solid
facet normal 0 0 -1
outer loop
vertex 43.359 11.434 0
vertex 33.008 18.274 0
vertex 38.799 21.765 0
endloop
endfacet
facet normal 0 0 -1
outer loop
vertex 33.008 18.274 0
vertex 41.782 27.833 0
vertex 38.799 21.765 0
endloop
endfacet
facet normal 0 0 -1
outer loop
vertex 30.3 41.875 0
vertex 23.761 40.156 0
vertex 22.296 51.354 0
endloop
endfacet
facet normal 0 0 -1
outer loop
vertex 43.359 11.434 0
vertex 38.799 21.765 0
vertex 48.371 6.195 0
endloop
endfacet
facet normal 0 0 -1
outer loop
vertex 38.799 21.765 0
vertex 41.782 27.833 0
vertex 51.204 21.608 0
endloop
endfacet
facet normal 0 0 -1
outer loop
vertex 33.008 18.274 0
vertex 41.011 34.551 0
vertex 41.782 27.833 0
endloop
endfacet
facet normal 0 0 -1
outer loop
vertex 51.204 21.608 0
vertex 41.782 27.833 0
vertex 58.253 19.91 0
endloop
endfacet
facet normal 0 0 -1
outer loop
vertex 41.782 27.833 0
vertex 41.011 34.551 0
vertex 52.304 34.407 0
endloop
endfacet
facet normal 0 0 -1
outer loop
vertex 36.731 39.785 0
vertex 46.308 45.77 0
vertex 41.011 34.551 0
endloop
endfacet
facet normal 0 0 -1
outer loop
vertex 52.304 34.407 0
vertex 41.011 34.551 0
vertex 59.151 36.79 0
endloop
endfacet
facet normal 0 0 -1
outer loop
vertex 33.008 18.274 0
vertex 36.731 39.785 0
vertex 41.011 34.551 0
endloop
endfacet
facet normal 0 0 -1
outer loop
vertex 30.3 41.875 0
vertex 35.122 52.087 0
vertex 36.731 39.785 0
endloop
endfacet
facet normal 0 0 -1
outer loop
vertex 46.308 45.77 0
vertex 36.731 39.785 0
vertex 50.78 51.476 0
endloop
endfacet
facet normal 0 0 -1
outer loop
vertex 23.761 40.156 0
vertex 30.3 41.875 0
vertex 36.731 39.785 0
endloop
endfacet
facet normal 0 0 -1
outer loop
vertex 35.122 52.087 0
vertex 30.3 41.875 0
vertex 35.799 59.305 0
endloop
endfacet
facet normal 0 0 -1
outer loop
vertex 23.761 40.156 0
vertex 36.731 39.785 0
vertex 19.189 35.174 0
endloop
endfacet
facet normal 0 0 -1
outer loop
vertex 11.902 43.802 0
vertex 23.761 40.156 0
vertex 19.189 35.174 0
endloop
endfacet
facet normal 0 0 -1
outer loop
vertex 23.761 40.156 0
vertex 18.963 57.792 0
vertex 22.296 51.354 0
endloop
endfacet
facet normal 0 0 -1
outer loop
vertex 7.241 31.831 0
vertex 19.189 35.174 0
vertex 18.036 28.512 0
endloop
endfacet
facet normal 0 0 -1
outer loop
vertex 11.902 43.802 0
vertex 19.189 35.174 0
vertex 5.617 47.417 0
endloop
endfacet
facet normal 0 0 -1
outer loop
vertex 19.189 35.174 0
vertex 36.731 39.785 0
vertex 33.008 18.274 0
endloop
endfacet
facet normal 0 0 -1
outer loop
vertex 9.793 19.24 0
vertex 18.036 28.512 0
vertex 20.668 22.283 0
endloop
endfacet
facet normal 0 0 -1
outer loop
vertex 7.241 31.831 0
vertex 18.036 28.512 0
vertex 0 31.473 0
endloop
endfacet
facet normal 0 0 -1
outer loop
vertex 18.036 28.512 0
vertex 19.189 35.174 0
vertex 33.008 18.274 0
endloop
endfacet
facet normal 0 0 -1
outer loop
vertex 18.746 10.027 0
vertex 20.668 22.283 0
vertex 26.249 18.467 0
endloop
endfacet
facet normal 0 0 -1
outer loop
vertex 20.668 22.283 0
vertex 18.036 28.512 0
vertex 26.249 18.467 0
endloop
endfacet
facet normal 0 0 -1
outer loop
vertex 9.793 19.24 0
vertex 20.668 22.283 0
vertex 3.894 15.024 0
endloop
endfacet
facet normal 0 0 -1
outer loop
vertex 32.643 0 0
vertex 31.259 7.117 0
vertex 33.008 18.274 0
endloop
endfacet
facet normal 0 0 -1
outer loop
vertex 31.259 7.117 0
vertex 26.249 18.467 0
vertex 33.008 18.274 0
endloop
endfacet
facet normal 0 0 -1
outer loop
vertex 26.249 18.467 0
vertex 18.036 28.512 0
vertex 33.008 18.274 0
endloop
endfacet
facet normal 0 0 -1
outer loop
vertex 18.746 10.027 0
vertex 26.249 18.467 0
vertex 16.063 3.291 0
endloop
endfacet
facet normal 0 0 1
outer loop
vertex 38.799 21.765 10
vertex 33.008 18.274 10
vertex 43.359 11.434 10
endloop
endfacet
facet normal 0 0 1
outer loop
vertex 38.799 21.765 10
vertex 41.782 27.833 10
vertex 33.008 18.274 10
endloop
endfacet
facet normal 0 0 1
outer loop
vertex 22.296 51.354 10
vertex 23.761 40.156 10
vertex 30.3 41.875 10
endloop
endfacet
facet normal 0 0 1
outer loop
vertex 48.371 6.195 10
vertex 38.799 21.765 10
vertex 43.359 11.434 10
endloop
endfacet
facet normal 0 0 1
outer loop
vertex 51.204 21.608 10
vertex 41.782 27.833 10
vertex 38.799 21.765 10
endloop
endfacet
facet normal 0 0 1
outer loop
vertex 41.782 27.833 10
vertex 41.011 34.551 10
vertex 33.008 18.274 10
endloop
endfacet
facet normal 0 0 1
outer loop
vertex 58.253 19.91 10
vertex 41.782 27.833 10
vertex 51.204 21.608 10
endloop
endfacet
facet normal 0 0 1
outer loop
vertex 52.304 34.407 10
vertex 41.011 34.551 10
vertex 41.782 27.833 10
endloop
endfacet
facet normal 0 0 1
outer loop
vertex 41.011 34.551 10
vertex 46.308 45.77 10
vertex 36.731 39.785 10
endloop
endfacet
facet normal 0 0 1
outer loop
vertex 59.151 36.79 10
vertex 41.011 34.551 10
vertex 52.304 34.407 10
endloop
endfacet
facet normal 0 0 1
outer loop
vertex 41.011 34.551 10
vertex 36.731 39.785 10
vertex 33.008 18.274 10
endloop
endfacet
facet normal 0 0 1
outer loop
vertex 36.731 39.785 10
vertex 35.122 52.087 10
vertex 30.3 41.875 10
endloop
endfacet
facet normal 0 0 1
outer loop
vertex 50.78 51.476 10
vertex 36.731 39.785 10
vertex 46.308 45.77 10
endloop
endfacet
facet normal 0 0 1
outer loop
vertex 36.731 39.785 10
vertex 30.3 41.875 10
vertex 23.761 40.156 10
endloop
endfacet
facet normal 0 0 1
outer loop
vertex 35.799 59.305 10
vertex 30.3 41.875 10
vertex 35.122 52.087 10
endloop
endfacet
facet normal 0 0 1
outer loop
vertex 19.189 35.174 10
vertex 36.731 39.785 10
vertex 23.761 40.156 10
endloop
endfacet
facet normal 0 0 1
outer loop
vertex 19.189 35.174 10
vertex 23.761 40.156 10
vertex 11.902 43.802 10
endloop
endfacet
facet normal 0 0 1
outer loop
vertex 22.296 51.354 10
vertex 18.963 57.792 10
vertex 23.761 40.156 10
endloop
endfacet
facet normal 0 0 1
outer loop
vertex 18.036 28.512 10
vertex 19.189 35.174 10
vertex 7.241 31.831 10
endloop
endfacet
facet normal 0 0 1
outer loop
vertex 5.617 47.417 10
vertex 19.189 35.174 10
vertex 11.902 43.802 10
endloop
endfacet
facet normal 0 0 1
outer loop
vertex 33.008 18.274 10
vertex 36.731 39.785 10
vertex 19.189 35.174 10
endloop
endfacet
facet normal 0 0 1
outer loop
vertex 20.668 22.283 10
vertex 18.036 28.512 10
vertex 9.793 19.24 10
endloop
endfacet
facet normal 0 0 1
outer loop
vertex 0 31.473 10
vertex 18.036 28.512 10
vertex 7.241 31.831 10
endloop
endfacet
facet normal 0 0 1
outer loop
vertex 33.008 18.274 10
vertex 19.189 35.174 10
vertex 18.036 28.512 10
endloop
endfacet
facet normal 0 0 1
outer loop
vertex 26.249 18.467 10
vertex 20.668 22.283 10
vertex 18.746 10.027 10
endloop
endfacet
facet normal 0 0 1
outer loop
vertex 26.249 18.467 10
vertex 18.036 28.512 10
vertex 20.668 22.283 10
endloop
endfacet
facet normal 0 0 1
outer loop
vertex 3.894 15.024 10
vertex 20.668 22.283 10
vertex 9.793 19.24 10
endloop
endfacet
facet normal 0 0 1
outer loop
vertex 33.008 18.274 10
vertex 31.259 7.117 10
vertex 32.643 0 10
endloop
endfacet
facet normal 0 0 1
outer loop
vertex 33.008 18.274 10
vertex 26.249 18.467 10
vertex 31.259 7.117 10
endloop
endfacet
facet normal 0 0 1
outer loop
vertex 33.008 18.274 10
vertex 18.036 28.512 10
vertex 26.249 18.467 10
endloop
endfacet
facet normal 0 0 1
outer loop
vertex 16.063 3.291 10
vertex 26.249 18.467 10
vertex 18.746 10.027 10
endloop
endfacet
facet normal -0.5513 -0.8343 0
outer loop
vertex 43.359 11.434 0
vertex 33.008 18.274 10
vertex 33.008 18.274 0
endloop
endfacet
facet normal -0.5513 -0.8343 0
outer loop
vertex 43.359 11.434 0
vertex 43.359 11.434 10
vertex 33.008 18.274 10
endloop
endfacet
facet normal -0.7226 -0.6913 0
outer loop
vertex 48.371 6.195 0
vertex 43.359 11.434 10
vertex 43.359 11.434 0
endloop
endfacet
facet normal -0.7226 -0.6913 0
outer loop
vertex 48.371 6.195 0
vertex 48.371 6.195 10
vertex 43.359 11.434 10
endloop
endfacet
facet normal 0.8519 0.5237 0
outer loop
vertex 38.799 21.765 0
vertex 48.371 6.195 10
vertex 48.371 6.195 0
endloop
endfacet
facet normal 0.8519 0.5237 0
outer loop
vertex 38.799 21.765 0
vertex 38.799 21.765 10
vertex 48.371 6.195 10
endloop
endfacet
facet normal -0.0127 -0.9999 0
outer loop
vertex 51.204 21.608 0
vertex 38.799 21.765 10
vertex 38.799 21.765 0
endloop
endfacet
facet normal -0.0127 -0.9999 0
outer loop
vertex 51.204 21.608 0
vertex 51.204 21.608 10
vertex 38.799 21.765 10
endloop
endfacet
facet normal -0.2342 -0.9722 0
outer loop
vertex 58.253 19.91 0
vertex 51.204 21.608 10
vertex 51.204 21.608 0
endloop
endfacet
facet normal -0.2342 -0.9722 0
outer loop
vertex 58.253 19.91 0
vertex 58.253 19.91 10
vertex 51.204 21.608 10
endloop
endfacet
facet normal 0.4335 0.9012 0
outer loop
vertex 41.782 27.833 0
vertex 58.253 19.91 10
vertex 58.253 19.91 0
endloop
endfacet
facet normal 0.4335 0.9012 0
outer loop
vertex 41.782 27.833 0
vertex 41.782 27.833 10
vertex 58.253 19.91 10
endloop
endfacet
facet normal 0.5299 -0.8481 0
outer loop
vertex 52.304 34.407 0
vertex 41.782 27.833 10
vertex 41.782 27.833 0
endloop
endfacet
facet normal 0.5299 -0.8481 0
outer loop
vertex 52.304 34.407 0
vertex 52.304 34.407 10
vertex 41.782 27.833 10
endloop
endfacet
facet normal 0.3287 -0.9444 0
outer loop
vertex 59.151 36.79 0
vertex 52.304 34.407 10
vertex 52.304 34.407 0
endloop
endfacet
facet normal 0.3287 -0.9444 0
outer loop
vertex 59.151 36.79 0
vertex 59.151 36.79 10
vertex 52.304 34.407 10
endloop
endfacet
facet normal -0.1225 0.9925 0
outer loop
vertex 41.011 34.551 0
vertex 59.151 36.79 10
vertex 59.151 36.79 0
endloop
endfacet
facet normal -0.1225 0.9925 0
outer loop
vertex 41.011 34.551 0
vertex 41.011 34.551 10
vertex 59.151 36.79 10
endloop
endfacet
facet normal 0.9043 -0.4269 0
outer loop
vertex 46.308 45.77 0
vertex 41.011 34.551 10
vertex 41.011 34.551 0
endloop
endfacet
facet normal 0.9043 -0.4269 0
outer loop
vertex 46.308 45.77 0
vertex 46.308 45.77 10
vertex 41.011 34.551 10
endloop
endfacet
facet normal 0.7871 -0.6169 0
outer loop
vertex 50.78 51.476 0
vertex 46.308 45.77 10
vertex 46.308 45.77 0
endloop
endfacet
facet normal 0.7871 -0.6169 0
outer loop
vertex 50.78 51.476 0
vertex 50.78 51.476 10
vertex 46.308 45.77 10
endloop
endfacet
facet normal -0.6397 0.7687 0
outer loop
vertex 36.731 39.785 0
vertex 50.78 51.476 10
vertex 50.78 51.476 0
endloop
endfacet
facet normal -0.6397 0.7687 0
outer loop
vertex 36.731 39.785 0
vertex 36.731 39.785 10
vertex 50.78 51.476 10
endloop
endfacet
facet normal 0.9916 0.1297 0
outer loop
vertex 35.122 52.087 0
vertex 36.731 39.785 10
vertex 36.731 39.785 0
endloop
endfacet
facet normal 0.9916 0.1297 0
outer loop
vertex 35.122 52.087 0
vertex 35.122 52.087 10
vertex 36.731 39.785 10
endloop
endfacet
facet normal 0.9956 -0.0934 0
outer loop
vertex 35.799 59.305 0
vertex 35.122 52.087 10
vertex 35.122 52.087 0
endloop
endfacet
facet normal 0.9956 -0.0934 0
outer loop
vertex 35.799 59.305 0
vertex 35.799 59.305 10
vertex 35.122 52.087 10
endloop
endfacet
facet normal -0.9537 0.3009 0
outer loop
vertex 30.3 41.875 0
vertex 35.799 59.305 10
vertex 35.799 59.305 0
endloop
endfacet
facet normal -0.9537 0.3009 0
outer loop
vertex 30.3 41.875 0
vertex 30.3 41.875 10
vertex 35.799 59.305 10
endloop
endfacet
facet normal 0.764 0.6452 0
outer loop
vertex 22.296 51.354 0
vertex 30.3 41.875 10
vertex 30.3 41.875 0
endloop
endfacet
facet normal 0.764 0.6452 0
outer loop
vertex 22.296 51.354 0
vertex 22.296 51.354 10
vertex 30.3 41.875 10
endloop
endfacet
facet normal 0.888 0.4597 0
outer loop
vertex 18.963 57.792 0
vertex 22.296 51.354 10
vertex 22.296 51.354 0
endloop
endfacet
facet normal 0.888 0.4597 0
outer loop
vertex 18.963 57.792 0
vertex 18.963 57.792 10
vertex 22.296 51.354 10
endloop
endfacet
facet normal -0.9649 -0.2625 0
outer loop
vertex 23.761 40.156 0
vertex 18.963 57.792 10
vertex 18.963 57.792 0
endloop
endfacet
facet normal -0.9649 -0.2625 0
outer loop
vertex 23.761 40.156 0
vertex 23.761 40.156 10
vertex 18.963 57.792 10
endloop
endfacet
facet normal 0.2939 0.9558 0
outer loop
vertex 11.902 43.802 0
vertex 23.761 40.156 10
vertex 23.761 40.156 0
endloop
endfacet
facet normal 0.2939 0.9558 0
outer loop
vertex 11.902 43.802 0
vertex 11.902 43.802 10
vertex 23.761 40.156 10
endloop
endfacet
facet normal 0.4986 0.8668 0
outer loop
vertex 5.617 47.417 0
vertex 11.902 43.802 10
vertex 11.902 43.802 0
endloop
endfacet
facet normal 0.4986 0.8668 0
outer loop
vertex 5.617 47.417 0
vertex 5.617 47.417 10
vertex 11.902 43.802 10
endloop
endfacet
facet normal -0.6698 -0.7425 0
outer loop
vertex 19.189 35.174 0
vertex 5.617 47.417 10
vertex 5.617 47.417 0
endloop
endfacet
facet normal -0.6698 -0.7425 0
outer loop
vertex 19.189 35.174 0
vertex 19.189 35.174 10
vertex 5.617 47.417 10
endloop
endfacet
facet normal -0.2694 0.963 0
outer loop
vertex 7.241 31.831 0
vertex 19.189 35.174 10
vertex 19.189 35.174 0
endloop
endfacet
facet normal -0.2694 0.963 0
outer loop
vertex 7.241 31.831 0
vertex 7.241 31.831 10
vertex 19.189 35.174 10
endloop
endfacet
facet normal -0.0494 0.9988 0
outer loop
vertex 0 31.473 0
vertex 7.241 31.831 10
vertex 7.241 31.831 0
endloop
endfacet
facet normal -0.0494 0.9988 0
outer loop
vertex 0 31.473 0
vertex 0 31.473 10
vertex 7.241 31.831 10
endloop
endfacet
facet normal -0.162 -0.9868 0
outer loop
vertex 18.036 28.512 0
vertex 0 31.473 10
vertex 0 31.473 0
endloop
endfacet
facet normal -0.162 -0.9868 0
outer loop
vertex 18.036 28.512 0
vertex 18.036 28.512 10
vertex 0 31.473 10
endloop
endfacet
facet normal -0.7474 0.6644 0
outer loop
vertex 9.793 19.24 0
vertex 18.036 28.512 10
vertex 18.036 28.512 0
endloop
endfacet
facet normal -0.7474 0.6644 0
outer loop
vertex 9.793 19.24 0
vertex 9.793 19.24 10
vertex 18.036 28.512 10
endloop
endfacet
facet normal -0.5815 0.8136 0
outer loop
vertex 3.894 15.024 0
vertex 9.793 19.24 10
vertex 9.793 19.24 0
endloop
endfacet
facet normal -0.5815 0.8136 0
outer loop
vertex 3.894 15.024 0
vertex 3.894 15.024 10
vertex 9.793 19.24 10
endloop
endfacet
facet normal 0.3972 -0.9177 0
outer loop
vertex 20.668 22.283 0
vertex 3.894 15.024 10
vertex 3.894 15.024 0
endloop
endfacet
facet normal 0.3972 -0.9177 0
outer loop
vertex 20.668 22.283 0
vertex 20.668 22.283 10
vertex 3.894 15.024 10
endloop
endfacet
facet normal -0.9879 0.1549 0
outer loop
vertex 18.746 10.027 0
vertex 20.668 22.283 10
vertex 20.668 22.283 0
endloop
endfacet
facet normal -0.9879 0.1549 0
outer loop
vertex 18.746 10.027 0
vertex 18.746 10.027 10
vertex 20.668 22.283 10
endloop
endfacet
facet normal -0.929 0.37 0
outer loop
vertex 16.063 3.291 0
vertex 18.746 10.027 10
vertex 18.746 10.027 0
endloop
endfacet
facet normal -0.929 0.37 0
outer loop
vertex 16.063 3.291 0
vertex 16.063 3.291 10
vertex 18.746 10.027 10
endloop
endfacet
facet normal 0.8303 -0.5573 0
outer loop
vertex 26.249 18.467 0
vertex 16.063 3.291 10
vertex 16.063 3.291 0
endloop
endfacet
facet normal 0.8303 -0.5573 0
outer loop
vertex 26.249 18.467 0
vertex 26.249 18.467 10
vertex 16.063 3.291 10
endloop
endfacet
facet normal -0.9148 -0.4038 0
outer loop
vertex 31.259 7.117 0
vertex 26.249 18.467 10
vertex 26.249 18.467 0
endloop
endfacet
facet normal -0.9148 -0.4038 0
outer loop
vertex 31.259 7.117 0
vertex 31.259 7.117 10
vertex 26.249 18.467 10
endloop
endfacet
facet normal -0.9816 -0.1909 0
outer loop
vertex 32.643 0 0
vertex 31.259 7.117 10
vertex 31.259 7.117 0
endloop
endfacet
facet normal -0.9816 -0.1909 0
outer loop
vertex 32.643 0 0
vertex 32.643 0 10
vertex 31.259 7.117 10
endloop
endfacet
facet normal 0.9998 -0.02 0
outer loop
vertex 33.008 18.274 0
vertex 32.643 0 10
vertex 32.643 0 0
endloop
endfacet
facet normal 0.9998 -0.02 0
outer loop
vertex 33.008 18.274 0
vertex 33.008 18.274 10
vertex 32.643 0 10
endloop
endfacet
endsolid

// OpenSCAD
$fn = 32;

// ----------------------------------------------------------------------
// Fan rotor section: 11 blades, 12 mm hub radius, 18 mm blades
// ----------------------------------------------------------------------

// --- parameters (mm) ---
profile_height = 10;      // extrusion height
profile_points = 33;      // points of the closed outline

profile = [[41.782, 27.833], [52.304, 34.407], [59.151, 36.79], [41.011, 34.551], [46.308, 45.77], [50.78, 51.476], [36.731, 39.785], [35.122, 52.087], [35.799, 59.305], [30.3, 41.875], [22.296, 51.354], [18.963, 57.792], [23.761, 40.156], [11.902, 43.802], [5.617, 47.417], [19.189, 35.174], [7.241, 31.831], [0, 31.473], [18.036, 28.512], [9.793, 19.24], [3.894, 15.024], [20.668, 22.283], [18.746, 10.027], [16.063, 3.291], [26.249, 18.467], [31.259, 7.117], [32.643, 0], [33.008, 18.274], [43.359, 11.434], [48.371, 6.195], [38.799, 21.765], [51.204, 21.608], [58.253, 19.91]];  // single closed polygon, 33 points, counter clockwise

// --- the one profile operation ---
linear_extrude(height = profile_height) polygon(points = profile);
